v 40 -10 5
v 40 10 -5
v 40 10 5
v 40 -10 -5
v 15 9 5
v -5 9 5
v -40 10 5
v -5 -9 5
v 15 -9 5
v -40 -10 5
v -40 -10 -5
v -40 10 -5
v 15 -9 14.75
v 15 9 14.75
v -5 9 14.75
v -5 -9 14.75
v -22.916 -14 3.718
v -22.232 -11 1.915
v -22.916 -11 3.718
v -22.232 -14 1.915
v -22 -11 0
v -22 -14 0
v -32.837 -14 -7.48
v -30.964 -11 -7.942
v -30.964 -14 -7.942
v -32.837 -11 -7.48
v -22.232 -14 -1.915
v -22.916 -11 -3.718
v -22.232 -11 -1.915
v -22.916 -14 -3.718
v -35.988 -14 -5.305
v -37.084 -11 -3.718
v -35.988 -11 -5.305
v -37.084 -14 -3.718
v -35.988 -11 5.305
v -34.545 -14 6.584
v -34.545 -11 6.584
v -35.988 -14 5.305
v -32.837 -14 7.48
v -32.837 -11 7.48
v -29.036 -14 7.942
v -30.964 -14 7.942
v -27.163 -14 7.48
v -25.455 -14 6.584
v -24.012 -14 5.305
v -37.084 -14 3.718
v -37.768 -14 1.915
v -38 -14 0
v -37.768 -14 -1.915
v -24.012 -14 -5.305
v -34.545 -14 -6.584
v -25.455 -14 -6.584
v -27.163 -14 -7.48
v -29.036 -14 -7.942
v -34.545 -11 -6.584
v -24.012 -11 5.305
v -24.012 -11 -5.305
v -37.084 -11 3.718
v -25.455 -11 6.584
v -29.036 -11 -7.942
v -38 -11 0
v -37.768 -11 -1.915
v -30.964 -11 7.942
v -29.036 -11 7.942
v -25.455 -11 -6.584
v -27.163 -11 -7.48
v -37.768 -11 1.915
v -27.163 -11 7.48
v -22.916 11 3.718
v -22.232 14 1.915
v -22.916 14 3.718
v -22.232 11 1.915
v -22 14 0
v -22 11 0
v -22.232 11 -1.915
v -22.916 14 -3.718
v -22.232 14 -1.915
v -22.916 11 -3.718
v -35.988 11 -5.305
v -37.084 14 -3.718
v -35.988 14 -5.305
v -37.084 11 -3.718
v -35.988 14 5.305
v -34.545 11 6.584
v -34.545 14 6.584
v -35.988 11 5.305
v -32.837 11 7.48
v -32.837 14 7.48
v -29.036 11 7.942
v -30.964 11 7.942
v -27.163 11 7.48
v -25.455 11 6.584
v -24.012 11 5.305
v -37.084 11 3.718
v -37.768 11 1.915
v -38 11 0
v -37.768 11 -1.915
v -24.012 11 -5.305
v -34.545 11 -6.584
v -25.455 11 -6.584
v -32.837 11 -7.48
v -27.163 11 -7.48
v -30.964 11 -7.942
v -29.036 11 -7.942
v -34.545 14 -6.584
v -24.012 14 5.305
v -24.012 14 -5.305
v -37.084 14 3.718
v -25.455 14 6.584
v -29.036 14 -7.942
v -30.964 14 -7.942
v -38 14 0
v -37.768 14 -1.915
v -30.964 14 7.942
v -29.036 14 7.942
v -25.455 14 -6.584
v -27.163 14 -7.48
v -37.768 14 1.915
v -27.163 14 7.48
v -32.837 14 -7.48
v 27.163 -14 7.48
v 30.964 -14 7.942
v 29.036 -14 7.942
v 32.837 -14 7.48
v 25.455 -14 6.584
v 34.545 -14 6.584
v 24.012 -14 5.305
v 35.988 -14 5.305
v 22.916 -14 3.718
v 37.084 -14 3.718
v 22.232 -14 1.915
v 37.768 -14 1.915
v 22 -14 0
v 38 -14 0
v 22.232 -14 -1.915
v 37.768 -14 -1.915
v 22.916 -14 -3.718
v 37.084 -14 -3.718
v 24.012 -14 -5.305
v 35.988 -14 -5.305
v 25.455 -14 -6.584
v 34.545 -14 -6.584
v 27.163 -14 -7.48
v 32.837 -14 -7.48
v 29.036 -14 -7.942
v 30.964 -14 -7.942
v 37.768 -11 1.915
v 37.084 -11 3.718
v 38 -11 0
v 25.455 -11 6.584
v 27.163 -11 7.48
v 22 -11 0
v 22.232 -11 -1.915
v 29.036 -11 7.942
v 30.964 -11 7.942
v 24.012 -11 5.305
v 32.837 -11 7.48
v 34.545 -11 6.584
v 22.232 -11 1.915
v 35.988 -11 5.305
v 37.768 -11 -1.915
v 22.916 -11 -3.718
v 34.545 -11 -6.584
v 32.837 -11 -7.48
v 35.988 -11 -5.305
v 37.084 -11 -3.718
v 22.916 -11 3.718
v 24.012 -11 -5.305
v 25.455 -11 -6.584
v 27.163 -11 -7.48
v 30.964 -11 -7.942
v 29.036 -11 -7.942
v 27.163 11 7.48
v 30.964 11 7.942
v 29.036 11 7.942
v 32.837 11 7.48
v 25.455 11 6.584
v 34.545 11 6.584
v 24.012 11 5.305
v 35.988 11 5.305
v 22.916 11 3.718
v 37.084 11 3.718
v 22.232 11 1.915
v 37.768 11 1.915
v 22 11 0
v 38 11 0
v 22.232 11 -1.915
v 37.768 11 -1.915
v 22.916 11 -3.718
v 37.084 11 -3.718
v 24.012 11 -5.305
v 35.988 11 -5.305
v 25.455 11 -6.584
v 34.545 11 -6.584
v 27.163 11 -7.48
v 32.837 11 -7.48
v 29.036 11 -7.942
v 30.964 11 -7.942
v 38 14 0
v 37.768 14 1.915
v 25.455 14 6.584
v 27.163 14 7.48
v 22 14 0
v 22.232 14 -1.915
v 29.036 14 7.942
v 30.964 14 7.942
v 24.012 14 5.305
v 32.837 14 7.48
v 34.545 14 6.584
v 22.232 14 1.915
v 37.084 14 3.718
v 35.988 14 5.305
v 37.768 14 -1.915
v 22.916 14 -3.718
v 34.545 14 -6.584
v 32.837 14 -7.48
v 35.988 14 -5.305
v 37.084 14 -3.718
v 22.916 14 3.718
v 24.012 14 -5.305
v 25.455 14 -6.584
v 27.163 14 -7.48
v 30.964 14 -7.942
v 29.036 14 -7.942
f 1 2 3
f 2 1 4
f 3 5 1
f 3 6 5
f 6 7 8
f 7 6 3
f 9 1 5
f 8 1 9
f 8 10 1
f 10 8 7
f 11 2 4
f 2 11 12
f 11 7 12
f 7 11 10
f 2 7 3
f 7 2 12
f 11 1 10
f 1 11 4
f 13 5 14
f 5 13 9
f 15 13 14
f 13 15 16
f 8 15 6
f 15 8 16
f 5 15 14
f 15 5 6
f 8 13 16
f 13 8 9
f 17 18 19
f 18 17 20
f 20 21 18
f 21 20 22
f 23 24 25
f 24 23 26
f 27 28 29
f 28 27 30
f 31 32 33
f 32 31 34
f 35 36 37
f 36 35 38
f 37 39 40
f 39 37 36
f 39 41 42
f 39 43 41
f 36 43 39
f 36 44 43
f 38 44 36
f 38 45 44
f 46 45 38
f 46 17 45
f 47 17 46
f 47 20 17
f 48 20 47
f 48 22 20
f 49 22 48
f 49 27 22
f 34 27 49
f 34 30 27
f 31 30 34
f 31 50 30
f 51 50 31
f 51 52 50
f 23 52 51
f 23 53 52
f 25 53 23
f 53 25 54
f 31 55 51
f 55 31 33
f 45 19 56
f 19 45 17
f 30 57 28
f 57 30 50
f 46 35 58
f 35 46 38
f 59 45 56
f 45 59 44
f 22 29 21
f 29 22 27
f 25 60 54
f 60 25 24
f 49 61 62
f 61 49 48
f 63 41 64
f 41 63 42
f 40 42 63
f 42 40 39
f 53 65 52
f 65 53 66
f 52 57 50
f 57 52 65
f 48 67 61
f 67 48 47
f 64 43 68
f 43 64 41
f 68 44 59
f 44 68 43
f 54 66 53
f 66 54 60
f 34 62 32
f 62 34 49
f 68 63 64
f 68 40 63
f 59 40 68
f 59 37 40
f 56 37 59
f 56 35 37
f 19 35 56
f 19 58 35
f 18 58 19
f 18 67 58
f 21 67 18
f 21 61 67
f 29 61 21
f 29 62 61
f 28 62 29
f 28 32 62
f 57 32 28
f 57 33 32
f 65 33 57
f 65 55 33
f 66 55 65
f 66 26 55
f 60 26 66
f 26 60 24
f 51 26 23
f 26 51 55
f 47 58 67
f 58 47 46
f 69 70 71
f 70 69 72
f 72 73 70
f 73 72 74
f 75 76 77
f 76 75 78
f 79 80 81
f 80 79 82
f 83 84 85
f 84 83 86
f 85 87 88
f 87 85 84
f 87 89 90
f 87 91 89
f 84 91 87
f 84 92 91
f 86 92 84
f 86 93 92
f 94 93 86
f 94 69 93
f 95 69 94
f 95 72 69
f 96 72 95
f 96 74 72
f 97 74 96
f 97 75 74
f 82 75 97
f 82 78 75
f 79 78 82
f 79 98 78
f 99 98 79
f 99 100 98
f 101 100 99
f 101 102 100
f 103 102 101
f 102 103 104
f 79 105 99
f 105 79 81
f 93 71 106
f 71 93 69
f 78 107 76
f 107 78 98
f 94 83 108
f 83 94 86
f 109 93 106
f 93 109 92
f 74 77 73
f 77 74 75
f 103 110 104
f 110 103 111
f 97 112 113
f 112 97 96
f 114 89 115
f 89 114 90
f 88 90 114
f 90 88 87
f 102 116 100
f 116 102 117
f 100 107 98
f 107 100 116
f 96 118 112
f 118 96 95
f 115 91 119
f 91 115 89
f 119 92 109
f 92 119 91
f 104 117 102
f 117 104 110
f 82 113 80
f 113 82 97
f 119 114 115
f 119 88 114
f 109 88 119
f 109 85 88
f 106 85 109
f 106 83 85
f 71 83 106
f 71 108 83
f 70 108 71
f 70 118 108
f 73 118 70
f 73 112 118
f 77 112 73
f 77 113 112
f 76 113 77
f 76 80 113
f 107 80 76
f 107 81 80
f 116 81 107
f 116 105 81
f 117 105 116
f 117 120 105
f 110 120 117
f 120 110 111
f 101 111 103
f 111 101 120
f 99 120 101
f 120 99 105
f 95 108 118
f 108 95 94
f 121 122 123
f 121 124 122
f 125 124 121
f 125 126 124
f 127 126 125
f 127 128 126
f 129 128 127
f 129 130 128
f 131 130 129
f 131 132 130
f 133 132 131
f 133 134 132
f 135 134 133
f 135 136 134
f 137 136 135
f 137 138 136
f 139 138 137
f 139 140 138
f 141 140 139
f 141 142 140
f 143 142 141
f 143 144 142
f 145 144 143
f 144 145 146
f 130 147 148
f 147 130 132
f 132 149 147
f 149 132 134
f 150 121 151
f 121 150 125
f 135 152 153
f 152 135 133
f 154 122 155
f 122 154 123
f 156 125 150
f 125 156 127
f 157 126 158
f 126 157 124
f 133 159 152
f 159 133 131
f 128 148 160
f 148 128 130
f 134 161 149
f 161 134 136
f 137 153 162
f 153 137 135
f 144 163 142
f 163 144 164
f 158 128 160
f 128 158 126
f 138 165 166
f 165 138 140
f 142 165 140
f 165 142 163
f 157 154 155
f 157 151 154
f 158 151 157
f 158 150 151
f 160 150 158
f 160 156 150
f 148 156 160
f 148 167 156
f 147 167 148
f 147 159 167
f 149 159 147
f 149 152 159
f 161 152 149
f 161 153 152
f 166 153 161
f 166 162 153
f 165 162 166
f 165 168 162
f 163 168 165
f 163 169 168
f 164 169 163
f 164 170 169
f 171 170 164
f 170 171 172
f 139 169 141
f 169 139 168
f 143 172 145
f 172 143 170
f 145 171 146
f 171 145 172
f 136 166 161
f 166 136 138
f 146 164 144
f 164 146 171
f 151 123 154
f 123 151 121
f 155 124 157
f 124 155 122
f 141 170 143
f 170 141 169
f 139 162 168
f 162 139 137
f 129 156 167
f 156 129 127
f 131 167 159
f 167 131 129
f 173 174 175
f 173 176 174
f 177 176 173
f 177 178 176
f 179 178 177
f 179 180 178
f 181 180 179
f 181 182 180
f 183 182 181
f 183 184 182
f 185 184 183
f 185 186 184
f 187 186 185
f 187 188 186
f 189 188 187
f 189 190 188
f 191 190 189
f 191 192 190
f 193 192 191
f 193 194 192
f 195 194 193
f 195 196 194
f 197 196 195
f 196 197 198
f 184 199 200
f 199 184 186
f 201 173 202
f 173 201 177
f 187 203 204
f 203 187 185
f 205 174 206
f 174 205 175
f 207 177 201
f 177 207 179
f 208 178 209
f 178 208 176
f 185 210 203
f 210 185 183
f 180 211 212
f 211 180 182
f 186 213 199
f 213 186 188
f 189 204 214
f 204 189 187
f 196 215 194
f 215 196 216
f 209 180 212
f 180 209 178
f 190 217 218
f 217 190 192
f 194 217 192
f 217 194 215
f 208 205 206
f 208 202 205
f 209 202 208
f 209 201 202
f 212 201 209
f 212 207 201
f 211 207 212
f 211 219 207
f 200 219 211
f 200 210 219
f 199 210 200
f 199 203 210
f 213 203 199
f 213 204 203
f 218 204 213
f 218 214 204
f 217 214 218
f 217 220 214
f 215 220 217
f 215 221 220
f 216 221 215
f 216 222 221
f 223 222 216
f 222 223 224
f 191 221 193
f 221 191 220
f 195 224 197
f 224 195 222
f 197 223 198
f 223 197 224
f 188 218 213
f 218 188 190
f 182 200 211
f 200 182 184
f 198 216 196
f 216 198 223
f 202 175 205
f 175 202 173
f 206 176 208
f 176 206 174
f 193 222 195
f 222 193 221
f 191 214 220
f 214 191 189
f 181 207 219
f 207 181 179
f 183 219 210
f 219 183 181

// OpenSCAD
/*
Example creation

Notes:
- F5 to update preview
- end command with ;
*/

// define tolerance to help overlap parts to connect them
tol=0.5;

// define car body
body_length=80;
body_width=20;
body_height=10;
color("blue", alpha=0.5)
cube([body_length, body_width, body_height], center=true);
  
// using tol to attach top to body
top_length=20;
top_width=body_width-2;
top_height=10;
// object center=true so translation will be relative to center of object
translate([5,0,10-tol])
color("yellow", alpha=0.5)
   cube([top_length, top_width, top_height+tol], center=true); 
   
// create wheel object
wheel_width=3;
wheel_radius=8;
module wheel()
{rotate([90,0,0])
  color("black")
  cylinder(h=wheel_width,r=wheel_radius, center=true);
}

// add wheels
front_dist_from_front=10;
back_dist_from_back=10;
bodysep=1;
// front left
translate([-(body_length/2-front_dist_from_front),-body_width/2-wheel_width/2-bodysep,0])
    wheel();
// front right
translate([-(body_length/2-front_dist_from_front), body_width/2+wheel_width/2+bodysep,0])
    wheel();
// back left
translate([ (body_length/2-front_dist_from_front),-body_width/2-wheel_width/2-bodysep,0])
    wheel();
// back right
translate([ (body_length/2-front_dist_from_front), body_width/2+wheel_width/2+bodysep,0])
    wheel();
